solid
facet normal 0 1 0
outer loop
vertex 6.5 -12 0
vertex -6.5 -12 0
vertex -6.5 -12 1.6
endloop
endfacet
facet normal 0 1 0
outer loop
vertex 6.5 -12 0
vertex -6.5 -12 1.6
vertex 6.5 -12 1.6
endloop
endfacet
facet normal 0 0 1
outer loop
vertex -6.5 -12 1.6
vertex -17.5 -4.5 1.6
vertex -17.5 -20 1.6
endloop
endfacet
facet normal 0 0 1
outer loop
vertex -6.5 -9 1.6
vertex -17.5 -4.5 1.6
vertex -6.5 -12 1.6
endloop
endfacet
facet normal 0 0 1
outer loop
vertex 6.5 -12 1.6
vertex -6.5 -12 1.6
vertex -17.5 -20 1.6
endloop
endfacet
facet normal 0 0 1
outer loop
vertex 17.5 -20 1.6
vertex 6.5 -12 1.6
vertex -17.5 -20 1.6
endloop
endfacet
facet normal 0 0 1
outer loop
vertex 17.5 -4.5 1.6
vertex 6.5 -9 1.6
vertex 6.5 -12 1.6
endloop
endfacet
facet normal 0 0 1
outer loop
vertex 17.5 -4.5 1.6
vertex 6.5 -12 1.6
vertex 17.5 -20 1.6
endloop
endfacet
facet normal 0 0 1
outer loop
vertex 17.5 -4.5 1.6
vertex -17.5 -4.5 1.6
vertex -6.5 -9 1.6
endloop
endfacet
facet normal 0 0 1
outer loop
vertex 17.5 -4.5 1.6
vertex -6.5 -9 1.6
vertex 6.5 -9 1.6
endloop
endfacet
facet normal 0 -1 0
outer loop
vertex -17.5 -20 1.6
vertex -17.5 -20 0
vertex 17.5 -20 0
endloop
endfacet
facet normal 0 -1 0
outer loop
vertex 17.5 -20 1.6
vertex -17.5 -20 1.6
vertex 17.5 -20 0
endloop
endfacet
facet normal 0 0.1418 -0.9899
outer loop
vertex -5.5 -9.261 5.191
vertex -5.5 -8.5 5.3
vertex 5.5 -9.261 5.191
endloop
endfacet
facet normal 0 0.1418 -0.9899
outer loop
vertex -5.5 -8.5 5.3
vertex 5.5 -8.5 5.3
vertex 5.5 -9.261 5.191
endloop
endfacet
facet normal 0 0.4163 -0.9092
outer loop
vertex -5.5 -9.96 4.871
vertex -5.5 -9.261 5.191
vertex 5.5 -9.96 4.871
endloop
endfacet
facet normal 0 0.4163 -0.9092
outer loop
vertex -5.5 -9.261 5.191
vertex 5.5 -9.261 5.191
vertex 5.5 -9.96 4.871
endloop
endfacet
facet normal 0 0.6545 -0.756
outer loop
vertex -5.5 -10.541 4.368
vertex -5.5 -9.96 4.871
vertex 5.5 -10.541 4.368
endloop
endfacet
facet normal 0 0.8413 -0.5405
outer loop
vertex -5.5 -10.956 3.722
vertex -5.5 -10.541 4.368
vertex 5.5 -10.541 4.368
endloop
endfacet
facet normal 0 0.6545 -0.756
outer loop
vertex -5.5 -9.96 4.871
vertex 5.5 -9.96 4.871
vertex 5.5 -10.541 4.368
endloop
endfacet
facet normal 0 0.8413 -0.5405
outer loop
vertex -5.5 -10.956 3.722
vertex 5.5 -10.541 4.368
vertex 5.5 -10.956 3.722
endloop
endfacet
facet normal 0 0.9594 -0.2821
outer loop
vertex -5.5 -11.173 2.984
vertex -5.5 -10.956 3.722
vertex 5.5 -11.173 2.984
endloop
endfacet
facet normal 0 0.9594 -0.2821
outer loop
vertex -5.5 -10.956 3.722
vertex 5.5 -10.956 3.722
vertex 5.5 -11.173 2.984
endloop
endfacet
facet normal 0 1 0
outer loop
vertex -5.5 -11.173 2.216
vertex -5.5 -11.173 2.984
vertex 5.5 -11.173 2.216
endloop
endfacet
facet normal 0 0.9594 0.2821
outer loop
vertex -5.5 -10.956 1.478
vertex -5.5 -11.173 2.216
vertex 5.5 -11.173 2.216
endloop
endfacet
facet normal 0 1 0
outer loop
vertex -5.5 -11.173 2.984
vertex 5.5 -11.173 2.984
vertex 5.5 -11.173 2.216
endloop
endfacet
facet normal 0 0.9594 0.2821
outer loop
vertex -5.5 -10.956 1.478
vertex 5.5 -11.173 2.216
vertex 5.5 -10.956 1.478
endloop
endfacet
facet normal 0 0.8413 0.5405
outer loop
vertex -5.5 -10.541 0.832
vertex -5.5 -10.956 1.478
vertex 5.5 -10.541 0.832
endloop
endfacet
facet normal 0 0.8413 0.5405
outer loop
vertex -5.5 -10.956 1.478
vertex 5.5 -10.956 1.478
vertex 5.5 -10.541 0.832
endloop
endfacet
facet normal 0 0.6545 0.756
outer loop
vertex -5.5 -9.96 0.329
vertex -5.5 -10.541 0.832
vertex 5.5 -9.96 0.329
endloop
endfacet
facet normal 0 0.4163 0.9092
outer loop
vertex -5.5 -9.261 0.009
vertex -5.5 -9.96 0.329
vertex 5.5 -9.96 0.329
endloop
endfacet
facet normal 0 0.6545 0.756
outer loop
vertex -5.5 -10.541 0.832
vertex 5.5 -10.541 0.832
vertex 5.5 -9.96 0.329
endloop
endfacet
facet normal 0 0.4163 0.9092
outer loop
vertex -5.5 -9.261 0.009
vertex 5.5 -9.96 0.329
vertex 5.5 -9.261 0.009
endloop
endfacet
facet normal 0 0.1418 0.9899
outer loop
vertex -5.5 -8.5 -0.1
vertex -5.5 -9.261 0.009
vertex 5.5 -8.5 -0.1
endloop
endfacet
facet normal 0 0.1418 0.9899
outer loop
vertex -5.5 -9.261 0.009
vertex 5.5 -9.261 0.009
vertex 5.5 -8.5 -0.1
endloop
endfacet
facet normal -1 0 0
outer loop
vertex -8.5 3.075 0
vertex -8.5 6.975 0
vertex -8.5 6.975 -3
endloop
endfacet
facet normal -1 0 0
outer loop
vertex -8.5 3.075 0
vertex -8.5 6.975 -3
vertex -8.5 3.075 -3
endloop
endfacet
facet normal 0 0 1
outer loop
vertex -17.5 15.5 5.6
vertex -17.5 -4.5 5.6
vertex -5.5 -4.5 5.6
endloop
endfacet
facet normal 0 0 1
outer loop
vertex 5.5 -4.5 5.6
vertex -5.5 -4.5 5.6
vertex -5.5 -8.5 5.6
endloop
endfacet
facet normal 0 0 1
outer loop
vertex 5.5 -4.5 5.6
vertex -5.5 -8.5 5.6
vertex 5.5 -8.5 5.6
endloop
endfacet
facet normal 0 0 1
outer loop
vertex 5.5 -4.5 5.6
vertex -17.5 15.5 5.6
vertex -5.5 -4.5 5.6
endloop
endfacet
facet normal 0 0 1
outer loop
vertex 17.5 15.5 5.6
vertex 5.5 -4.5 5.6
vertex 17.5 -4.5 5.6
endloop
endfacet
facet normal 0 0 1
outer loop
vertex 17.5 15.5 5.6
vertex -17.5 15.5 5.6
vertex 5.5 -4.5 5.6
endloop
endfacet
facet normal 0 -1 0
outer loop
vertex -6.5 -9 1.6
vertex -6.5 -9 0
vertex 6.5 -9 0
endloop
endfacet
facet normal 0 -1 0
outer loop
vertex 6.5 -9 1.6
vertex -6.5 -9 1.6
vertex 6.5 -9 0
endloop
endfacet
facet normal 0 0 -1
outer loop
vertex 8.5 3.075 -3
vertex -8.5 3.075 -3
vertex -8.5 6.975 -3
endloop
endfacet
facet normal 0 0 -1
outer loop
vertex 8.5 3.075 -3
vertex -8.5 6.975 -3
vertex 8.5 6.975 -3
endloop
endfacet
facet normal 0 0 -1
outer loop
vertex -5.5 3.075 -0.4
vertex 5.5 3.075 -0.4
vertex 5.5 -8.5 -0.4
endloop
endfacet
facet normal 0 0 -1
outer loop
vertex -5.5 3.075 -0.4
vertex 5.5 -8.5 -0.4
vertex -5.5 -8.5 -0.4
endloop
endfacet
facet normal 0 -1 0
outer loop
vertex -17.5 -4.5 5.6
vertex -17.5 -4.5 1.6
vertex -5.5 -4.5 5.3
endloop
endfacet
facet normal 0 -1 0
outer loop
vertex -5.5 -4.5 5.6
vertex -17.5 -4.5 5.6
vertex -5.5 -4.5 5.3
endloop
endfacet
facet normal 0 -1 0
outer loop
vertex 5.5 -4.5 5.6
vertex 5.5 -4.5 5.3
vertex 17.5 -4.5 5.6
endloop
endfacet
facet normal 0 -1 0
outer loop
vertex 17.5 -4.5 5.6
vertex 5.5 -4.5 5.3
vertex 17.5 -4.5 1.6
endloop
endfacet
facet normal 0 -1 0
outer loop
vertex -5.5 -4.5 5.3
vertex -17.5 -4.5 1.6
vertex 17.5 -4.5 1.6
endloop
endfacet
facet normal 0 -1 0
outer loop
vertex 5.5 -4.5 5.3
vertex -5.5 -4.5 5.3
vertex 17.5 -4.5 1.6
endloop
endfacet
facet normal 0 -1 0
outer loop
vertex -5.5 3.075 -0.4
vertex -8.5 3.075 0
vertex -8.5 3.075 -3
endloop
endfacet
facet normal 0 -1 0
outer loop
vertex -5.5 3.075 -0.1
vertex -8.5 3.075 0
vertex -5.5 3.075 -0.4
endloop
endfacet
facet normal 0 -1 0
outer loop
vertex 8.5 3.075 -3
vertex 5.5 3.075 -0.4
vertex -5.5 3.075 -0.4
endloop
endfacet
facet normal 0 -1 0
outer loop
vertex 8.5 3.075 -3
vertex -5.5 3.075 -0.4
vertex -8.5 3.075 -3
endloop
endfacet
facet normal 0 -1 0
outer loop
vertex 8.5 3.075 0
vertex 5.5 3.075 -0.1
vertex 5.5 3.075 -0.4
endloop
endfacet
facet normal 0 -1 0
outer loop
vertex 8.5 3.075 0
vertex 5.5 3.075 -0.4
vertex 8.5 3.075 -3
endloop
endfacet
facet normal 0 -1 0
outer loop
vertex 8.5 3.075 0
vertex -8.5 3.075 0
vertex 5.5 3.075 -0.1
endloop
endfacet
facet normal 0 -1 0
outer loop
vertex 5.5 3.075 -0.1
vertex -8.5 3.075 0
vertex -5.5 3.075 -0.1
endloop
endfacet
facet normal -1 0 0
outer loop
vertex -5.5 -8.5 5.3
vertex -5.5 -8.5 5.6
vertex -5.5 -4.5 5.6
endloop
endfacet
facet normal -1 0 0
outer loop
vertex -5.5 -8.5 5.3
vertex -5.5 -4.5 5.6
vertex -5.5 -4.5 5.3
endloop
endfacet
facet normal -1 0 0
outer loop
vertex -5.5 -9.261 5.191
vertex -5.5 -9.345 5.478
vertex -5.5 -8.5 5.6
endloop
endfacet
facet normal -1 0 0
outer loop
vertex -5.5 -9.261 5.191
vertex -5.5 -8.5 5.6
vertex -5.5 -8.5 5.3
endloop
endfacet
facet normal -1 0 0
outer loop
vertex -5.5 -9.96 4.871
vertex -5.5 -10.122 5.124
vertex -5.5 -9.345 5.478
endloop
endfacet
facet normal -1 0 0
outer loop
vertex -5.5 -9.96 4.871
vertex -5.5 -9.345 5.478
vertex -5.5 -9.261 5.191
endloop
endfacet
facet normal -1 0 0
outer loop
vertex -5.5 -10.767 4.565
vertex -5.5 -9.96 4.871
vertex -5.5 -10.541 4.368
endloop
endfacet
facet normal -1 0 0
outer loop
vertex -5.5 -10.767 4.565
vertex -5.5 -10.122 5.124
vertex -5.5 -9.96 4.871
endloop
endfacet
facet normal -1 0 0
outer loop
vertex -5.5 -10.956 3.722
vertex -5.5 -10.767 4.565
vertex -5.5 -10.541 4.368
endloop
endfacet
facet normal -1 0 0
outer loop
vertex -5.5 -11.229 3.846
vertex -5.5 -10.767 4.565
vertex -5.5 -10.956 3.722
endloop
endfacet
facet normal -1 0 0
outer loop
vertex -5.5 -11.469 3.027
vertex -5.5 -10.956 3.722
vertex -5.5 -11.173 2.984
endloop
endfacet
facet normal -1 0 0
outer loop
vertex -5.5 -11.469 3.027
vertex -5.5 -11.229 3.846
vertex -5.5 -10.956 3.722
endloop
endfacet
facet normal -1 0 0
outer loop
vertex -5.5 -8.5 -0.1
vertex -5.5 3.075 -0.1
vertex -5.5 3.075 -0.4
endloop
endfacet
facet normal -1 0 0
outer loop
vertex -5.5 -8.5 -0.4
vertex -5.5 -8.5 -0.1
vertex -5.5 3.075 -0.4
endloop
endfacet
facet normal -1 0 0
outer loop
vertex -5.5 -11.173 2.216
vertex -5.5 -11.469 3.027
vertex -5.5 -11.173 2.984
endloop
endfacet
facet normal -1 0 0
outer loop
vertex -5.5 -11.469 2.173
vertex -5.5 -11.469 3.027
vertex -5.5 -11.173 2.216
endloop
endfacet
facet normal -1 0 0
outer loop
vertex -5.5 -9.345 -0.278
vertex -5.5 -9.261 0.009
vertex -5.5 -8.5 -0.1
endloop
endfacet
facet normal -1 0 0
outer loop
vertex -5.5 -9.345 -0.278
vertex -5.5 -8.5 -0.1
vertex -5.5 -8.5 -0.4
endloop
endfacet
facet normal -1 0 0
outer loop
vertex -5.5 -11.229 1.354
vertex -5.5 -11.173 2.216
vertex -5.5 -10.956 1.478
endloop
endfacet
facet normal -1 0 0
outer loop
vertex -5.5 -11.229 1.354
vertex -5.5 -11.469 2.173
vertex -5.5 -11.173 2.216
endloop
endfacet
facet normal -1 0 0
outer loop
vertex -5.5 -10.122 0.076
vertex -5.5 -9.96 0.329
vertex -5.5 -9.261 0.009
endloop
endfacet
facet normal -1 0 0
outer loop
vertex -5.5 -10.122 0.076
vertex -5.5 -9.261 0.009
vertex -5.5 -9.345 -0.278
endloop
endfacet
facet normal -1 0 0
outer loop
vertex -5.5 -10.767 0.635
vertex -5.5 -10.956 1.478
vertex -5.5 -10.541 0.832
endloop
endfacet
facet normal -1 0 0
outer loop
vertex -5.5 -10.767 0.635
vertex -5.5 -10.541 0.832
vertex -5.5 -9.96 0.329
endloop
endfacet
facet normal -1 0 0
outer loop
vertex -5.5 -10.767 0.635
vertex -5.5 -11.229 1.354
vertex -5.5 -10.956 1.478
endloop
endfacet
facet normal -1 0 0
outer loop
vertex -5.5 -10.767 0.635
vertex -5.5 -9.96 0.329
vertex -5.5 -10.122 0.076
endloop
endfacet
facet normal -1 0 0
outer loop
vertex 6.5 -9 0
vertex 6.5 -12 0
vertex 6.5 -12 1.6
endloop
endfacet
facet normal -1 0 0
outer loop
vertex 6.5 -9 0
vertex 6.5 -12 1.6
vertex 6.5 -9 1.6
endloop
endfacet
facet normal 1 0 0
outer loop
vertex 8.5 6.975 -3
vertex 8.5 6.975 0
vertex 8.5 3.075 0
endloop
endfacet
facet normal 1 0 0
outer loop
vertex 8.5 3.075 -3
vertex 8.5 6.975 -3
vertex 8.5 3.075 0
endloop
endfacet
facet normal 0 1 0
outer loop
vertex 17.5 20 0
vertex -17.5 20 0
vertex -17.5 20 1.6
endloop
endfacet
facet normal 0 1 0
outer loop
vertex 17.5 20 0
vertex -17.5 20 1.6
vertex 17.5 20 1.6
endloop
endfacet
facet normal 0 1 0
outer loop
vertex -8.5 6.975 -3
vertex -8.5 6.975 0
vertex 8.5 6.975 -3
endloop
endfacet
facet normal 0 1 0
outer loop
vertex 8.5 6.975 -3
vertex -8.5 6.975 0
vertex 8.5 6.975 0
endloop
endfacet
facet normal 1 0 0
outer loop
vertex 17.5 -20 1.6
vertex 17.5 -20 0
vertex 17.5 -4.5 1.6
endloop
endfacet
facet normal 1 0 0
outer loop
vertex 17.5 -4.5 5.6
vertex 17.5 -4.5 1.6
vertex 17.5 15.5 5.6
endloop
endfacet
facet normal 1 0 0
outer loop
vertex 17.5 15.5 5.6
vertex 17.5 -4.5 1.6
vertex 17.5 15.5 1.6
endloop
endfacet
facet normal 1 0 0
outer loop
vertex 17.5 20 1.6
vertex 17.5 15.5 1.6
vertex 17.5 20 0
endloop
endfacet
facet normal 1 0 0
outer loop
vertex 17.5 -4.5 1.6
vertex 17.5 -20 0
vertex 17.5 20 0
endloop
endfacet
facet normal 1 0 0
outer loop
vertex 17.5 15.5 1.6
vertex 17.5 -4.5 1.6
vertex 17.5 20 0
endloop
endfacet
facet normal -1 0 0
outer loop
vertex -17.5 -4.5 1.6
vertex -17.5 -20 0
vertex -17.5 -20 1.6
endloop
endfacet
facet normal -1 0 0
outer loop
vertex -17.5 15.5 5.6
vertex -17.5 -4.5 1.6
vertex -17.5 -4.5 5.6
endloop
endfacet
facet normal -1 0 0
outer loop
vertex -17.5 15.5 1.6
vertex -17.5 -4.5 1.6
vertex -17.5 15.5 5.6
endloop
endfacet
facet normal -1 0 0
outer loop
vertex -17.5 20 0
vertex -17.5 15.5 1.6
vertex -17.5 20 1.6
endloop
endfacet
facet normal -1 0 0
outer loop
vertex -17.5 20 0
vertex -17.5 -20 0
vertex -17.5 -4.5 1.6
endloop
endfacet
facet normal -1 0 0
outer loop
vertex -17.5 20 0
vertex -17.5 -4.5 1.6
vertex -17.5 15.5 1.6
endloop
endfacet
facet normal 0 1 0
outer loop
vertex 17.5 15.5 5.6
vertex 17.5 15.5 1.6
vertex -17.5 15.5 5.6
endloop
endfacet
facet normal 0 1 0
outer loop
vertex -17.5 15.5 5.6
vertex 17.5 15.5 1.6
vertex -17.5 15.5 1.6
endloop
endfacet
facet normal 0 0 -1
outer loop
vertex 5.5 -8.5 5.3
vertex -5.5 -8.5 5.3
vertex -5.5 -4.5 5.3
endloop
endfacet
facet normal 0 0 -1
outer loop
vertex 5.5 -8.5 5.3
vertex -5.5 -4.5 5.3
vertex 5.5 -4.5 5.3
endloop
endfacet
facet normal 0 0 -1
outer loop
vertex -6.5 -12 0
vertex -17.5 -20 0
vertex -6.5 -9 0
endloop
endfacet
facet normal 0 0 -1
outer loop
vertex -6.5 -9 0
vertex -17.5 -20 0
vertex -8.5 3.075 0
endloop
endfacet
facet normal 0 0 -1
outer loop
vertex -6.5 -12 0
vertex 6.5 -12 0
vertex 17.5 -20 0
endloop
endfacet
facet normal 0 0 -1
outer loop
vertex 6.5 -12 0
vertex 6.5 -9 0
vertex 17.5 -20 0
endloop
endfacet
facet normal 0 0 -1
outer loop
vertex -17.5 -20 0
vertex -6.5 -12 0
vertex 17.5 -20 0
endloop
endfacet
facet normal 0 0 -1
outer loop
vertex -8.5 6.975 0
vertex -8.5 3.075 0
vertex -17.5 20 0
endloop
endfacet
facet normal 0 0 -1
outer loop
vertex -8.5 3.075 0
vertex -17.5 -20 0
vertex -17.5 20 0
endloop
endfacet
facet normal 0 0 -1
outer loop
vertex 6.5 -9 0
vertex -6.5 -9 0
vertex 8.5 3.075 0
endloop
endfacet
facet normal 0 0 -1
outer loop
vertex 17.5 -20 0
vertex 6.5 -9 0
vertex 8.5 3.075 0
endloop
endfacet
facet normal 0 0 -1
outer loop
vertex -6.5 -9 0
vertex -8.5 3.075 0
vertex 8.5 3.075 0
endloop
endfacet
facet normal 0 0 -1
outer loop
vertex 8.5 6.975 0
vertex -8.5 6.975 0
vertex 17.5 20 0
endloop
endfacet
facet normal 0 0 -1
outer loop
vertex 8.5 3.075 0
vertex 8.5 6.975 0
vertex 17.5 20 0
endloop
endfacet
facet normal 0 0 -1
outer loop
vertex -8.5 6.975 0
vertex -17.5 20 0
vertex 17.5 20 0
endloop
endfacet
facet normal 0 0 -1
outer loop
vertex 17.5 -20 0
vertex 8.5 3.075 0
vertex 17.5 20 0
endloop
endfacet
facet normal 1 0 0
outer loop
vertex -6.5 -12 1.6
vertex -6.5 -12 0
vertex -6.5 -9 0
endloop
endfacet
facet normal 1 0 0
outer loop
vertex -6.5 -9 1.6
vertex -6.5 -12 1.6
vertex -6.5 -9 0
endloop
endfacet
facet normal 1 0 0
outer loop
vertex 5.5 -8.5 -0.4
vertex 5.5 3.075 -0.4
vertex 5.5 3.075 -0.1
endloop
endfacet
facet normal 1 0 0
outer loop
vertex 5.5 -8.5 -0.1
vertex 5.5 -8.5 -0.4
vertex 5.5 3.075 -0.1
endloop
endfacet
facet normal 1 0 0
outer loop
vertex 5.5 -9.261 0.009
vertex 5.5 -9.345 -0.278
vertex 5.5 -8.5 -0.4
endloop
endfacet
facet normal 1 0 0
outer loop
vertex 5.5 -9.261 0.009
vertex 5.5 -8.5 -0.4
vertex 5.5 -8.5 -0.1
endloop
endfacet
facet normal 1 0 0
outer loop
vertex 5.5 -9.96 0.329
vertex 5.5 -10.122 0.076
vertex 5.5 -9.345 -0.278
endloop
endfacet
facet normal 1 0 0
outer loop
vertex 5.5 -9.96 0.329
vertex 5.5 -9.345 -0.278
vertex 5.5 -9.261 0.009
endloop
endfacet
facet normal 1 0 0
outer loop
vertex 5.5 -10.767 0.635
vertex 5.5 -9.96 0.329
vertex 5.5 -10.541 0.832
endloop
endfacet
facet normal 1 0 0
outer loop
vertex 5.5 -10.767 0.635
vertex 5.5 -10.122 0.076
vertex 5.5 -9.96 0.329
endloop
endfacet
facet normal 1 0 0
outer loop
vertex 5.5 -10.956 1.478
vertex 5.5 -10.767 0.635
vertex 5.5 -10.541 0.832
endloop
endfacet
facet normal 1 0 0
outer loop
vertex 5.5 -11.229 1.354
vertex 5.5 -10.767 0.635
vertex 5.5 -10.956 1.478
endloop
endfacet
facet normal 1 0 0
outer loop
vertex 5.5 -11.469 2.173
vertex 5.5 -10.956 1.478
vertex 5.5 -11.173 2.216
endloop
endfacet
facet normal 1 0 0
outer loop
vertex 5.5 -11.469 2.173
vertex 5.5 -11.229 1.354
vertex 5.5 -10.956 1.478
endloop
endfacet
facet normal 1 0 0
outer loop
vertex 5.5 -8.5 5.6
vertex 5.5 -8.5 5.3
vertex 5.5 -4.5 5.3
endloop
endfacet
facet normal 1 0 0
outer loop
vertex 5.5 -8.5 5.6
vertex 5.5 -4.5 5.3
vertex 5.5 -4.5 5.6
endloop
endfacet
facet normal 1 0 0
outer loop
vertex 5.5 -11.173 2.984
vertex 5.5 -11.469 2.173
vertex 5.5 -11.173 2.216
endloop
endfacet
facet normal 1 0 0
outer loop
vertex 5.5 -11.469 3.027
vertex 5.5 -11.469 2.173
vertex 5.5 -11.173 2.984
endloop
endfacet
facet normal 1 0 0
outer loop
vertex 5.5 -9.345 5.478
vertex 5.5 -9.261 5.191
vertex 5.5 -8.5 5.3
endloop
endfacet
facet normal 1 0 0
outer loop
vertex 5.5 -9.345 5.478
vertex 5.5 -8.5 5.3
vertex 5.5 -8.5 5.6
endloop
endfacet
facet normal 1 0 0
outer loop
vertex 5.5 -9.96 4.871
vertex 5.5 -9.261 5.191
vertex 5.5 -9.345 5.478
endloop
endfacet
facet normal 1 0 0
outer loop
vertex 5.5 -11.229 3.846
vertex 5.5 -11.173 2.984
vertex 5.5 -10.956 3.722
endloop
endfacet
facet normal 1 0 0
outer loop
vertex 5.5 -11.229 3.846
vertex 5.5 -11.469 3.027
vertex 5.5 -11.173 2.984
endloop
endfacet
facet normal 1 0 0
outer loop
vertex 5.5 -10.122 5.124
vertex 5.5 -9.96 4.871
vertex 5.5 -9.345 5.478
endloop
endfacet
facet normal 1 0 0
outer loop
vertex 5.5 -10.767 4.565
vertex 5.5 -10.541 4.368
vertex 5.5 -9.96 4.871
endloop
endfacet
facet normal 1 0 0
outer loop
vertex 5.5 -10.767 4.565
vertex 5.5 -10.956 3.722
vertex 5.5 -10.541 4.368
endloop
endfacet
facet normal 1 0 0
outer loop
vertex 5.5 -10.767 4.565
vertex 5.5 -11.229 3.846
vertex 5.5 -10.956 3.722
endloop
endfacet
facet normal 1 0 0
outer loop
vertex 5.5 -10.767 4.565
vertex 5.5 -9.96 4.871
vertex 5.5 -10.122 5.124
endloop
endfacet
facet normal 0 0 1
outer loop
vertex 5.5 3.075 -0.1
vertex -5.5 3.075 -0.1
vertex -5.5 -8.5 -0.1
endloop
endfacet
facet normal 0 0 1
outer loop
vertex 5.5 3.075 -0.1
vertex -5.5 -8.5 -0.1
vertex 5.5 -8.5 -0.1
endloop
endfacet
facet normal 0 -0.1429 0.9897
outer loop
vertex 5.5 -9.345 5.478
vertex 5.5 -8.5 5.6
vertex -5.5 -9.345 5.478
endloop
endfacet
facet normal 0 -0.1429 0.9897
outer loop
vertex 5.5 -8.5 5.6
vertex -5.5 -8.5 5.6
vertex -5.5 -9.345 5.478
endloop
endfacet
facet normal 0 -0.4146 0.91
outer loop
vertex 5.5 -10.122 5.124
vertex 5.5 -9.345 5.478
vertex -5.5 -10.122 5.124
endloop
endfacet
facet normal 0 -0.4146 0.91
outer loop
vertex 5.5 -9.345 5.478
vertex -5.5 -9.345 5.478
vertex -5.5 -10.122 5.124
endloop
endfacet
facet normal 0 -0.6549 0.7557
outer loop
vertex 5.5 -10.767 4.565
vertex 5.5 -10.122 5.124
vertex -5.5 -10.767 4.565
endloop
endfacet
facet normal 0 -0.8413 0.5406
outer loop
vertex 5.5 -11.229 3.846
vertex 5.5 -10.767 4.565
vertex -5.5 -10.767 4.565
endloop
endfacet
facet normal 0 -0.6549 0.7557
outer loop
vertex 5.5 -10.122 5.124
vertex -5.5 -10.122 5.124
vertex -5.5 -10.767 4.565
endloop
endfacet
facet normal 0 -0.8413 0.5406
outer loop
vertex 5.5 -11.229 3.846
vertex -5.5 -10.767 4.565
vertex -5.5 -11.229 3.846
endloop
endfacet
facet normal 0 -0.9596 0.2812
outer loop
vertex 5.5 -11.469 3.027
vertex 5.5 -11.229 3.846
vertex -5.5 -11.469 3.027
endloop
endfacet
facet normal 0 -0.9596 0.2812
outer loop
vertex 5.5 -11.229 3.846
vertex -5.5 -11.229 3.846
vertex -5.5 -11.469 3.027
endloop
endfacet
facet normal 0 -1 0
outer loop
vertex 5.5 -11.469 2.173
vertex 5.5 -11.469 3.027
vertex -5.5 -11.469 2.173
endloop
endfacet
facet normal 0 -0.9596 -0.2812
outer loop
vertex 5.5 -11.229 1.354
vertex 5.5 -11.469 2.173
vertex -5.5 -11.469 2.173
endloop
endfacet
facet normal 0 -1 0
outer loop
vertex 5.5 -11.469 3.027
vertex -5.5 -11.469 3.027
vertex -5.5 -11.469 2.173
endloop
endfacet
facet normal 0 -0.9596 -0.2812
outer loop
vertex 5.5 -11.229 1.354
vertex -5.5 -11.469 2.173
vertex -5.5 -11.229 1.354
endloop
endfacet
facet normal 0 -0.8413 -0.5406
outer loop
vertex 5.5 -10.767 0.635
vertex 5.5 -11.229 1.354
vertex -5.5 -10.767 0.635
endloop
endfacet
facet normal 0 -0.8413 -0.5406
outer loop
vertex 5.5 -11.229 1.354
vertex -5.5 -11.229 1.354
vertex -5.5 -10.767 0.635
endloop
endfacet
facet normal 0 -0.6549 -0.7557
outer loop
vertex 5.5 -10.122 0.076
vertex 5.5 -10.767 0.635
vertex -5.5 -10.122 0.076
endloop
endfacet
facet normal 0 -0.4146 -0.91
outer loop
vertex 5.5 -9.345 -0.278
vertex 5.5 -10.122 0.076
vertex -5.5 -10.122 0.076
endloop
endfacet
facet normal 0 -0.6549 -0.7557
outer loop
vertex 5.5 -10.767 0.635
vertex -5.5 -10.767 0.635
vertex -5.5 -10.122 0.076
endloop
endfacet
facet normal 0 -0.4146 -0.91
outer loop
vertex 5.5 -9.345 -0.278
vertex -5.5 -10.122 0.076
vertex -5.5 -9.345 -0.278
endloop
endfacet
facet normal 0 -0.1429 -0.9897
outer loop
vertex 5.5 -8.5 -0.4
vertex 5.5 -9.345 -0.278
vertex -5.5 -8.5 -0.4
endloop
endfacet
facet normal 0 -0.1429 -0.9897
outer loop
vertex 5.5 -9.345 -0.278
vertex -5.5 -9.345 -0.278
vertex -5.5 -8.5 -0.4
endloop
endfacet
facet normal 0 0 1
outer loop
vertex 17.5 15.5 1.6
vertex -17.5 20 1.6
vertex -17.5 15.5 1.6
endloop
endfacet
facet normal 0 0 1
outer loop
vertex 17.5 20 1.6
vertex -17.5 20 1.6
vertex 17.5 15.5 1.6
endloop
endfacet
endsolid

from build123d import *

# Parameters (mm, degrees)
F0_W     = 35
F0_H     = 40
F0_W_2   = 13
F0_H_2   = 3
F1_DEPTH = 1.6
F2_W     = 11
F2_H     = 1
F3_DEPTH = 4
F5_W     = 11
F5_H     = 0.3
F7_W     = 17
F7_H     = 3.9
F8_DEPTH = 3


with BuildPart() as f1:
    # F0 (on Top) → F1 (new body)
    with BuildSketch(Plane.XY):
        Rectangle(F0_W, F0_H)
        with Locations((0, -10.5)):
            Rectangle(F0_W_2, F0_H_2, mode=Mode.SUBTRACT)
    extrude(amount=F1_DEPTH)

    # F2 (on face) → F3 (join)
    with BuildSketch(Plane.XY.offset(1.6)):
        Polygon((17.5, 15.5), (-17.5, 15.5), (-17.5, -4.5), (-5.5, -4.5), (-5.5, -3.5), (5.5, -3.5), (5.5, -4.5), (17.5, -4.5), align=None)
        with Locations((0, -4)):
            Rectangle(F2_W, F2_H)
    extrude(amount=F3_DEPTH)

    # F6: sweep along a path in F4
    with BuildLine(Plane.YZ) as f6_path:
        Line((-4.5, 5.6), (-8.5, 5.6))
        ThreePointArc((-8.5, 5.6), (-11.5, 2.6), (-8.5, -0.4))
        Line((-8.5, -0.4), (6.975, -0.4))
    # F5 (on face) → F6 (sweep)
    with BuildSketch(Plane.XZ.offset(4.5)):
        with Locations((0, 5.45)):
            Rectangle(F5_W, F5_H)
    sweep(path=f6_path.line)

    # F7 (on face) → F8 (join)
    with BuildSketch(Plane(origin=(0, 0, 0), x_dir=(1, 0, 0), z_dir=(0, 0, -1))):
        with Locations((0, -5.025)):
            Rectangle(F7_W, F7_H)
    extrude(amount=F8_DEPTH)


solid = f1.part
